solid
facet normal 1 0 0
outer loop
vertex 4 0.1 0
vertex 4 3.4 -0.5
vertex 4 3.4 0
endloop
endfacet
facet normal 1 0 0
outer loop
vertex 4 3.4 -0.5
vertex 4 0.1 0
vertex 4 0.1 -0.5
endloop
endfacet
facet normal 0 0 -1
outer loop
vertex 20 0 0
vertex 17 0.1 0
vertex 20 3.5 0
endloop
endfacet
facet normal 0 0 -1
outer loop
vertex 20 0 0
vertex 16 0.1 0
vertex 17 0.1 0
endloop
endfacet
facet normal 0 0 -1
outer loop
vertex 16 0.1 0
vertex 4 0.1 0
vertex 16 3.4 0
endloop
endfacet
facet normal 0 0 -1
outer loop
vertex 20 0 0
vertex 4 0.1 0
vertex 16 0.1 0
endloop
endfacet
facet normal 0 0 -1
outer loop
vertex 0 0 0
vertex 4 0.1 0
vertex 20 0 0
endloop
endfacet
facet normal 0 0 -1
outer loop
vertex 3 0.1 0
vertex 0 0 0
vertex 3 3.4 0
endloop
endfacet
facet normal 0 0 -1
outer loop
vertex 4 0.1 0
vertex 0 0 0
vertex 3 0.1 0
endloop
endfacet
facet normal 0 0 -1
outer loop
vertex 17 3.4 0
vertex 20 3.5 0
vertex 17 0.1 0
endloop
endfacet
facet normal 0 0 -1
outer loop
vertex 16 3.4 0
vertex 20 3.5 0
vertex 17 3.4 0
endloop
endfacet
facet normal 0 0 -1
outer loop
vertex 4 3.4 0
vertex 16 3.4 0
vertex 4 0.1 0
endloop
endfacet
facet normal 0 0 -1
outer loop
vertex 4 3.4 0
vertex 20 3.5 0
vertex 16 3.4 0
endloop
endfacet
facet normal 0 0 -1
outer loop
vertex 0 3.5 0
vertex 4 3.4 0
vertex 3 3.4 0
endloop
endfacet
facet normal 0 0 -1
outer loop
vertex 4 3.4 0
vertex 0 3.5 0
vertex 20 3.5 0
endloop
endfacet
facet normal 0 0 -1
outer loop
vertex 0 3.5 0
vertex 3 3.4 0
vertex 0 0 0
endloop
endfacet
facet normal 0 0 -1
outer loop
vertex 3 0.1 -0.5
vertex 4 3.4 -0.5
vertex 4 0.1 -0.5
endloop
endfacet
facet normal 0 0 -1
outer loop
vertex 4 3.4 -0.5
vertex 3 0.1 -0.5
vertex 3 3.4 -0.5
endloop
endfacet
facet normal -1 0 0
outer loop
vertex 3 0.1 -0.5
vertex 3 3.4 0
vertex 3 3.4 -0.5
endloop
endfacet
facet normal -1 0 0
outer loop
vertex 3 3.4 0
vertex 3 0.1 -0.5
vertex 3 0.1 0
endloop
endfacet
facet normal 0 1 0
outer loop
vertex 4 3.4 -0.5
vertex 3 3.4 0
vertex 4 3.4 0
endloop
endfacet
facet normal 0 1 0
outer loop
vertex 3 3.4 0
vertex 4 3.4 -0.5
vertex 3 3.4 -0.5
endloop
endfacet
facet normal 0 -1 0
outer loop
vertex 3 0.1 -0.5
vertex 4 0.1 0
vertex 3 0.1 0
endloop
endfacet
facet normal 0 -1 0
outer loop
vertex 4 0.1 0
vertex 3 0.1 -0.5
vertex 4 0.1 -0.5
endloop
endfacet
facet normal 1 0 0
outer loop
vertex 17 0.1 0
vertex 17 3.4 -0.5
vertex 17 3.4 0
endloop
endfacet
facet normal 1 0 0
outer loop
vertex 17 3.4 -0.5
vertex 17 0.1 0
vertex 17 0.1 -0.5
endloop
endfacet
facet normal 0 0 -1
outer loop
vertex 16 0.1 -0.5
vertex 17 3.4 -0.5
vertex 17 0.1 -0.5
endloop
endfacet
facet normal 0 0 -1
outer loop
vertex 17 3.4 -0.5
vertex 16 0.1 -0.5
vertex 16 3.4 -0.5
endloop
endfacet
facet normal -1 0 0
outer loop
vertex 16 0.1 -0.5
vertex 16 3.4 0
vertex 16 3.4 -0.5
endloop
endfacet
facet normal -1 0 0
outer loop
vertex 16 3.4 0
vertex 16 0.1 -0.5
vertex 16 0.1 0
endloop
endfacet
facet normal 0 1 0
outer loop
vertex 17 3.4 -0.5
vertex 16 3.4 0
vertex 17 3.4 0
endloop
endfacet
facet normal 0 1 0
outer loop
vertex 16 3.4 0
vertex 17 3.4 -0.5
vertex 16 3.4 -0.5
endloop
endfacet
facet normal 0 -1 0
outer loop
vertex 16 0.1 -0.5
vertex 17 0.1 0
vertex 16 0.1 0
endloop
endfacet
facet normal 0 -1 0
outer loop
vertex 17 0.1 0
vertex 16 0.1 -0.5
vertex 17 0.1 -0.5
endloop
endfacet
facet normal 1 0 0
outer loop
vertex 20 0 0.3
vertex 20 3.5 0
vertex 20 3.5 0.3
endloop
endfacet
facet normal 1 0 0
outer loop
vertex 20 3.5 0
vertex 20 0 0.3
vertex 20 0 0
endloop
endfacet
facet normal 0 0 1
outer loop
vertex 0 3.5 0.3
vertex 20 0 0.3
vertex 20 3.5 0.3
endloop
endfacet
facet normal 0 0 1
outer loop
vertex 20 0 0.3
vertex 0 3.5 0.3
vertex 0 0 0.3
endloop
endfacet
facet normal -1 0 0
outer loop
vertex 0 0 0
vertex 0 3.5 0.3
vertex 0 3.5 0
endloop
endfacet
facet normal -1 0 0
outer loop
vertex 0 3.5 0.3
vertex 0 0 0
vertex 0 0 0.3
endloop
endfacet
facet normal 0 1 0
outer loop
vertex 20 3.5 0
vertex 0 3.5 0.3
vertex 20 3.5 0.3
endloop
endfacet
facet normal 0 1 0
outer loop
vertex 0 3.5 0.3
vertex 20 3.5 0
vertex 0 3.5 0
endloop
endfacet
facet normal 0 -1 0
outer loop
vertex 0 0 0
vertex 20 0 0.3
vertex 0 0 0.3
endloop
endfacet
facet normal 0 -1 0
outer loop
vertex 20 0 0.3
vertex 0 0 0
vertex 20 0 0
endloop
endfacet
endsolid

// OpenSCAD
// file: global.scad
$fn = 20;

epsilon = 0.005;
epsilon2 = epsilon * 2;

width = 20;
height = 5.5;
depth = 15;
thickness = 0.3;

explode_dist = 10;
// main file
include <global.scad>;

module part4()
{
    color("SaddleBrown")
    {
        cube(size = [width, height - 2, thickness]);
    }
}

module part4_skeleton()
{
    color("SaddleBrown")
    {
        translate([3, 0.1, -0.5]) cube(size = [1, height - 2.2, 0.5]);
        translate([width - 4, 0.1, -0.5]) cube(size = [1, height - 2.2, 0.5]);
    }
}

module part4_2d()
{
    projection() part4();
}

part4();
part4_skeleton();
